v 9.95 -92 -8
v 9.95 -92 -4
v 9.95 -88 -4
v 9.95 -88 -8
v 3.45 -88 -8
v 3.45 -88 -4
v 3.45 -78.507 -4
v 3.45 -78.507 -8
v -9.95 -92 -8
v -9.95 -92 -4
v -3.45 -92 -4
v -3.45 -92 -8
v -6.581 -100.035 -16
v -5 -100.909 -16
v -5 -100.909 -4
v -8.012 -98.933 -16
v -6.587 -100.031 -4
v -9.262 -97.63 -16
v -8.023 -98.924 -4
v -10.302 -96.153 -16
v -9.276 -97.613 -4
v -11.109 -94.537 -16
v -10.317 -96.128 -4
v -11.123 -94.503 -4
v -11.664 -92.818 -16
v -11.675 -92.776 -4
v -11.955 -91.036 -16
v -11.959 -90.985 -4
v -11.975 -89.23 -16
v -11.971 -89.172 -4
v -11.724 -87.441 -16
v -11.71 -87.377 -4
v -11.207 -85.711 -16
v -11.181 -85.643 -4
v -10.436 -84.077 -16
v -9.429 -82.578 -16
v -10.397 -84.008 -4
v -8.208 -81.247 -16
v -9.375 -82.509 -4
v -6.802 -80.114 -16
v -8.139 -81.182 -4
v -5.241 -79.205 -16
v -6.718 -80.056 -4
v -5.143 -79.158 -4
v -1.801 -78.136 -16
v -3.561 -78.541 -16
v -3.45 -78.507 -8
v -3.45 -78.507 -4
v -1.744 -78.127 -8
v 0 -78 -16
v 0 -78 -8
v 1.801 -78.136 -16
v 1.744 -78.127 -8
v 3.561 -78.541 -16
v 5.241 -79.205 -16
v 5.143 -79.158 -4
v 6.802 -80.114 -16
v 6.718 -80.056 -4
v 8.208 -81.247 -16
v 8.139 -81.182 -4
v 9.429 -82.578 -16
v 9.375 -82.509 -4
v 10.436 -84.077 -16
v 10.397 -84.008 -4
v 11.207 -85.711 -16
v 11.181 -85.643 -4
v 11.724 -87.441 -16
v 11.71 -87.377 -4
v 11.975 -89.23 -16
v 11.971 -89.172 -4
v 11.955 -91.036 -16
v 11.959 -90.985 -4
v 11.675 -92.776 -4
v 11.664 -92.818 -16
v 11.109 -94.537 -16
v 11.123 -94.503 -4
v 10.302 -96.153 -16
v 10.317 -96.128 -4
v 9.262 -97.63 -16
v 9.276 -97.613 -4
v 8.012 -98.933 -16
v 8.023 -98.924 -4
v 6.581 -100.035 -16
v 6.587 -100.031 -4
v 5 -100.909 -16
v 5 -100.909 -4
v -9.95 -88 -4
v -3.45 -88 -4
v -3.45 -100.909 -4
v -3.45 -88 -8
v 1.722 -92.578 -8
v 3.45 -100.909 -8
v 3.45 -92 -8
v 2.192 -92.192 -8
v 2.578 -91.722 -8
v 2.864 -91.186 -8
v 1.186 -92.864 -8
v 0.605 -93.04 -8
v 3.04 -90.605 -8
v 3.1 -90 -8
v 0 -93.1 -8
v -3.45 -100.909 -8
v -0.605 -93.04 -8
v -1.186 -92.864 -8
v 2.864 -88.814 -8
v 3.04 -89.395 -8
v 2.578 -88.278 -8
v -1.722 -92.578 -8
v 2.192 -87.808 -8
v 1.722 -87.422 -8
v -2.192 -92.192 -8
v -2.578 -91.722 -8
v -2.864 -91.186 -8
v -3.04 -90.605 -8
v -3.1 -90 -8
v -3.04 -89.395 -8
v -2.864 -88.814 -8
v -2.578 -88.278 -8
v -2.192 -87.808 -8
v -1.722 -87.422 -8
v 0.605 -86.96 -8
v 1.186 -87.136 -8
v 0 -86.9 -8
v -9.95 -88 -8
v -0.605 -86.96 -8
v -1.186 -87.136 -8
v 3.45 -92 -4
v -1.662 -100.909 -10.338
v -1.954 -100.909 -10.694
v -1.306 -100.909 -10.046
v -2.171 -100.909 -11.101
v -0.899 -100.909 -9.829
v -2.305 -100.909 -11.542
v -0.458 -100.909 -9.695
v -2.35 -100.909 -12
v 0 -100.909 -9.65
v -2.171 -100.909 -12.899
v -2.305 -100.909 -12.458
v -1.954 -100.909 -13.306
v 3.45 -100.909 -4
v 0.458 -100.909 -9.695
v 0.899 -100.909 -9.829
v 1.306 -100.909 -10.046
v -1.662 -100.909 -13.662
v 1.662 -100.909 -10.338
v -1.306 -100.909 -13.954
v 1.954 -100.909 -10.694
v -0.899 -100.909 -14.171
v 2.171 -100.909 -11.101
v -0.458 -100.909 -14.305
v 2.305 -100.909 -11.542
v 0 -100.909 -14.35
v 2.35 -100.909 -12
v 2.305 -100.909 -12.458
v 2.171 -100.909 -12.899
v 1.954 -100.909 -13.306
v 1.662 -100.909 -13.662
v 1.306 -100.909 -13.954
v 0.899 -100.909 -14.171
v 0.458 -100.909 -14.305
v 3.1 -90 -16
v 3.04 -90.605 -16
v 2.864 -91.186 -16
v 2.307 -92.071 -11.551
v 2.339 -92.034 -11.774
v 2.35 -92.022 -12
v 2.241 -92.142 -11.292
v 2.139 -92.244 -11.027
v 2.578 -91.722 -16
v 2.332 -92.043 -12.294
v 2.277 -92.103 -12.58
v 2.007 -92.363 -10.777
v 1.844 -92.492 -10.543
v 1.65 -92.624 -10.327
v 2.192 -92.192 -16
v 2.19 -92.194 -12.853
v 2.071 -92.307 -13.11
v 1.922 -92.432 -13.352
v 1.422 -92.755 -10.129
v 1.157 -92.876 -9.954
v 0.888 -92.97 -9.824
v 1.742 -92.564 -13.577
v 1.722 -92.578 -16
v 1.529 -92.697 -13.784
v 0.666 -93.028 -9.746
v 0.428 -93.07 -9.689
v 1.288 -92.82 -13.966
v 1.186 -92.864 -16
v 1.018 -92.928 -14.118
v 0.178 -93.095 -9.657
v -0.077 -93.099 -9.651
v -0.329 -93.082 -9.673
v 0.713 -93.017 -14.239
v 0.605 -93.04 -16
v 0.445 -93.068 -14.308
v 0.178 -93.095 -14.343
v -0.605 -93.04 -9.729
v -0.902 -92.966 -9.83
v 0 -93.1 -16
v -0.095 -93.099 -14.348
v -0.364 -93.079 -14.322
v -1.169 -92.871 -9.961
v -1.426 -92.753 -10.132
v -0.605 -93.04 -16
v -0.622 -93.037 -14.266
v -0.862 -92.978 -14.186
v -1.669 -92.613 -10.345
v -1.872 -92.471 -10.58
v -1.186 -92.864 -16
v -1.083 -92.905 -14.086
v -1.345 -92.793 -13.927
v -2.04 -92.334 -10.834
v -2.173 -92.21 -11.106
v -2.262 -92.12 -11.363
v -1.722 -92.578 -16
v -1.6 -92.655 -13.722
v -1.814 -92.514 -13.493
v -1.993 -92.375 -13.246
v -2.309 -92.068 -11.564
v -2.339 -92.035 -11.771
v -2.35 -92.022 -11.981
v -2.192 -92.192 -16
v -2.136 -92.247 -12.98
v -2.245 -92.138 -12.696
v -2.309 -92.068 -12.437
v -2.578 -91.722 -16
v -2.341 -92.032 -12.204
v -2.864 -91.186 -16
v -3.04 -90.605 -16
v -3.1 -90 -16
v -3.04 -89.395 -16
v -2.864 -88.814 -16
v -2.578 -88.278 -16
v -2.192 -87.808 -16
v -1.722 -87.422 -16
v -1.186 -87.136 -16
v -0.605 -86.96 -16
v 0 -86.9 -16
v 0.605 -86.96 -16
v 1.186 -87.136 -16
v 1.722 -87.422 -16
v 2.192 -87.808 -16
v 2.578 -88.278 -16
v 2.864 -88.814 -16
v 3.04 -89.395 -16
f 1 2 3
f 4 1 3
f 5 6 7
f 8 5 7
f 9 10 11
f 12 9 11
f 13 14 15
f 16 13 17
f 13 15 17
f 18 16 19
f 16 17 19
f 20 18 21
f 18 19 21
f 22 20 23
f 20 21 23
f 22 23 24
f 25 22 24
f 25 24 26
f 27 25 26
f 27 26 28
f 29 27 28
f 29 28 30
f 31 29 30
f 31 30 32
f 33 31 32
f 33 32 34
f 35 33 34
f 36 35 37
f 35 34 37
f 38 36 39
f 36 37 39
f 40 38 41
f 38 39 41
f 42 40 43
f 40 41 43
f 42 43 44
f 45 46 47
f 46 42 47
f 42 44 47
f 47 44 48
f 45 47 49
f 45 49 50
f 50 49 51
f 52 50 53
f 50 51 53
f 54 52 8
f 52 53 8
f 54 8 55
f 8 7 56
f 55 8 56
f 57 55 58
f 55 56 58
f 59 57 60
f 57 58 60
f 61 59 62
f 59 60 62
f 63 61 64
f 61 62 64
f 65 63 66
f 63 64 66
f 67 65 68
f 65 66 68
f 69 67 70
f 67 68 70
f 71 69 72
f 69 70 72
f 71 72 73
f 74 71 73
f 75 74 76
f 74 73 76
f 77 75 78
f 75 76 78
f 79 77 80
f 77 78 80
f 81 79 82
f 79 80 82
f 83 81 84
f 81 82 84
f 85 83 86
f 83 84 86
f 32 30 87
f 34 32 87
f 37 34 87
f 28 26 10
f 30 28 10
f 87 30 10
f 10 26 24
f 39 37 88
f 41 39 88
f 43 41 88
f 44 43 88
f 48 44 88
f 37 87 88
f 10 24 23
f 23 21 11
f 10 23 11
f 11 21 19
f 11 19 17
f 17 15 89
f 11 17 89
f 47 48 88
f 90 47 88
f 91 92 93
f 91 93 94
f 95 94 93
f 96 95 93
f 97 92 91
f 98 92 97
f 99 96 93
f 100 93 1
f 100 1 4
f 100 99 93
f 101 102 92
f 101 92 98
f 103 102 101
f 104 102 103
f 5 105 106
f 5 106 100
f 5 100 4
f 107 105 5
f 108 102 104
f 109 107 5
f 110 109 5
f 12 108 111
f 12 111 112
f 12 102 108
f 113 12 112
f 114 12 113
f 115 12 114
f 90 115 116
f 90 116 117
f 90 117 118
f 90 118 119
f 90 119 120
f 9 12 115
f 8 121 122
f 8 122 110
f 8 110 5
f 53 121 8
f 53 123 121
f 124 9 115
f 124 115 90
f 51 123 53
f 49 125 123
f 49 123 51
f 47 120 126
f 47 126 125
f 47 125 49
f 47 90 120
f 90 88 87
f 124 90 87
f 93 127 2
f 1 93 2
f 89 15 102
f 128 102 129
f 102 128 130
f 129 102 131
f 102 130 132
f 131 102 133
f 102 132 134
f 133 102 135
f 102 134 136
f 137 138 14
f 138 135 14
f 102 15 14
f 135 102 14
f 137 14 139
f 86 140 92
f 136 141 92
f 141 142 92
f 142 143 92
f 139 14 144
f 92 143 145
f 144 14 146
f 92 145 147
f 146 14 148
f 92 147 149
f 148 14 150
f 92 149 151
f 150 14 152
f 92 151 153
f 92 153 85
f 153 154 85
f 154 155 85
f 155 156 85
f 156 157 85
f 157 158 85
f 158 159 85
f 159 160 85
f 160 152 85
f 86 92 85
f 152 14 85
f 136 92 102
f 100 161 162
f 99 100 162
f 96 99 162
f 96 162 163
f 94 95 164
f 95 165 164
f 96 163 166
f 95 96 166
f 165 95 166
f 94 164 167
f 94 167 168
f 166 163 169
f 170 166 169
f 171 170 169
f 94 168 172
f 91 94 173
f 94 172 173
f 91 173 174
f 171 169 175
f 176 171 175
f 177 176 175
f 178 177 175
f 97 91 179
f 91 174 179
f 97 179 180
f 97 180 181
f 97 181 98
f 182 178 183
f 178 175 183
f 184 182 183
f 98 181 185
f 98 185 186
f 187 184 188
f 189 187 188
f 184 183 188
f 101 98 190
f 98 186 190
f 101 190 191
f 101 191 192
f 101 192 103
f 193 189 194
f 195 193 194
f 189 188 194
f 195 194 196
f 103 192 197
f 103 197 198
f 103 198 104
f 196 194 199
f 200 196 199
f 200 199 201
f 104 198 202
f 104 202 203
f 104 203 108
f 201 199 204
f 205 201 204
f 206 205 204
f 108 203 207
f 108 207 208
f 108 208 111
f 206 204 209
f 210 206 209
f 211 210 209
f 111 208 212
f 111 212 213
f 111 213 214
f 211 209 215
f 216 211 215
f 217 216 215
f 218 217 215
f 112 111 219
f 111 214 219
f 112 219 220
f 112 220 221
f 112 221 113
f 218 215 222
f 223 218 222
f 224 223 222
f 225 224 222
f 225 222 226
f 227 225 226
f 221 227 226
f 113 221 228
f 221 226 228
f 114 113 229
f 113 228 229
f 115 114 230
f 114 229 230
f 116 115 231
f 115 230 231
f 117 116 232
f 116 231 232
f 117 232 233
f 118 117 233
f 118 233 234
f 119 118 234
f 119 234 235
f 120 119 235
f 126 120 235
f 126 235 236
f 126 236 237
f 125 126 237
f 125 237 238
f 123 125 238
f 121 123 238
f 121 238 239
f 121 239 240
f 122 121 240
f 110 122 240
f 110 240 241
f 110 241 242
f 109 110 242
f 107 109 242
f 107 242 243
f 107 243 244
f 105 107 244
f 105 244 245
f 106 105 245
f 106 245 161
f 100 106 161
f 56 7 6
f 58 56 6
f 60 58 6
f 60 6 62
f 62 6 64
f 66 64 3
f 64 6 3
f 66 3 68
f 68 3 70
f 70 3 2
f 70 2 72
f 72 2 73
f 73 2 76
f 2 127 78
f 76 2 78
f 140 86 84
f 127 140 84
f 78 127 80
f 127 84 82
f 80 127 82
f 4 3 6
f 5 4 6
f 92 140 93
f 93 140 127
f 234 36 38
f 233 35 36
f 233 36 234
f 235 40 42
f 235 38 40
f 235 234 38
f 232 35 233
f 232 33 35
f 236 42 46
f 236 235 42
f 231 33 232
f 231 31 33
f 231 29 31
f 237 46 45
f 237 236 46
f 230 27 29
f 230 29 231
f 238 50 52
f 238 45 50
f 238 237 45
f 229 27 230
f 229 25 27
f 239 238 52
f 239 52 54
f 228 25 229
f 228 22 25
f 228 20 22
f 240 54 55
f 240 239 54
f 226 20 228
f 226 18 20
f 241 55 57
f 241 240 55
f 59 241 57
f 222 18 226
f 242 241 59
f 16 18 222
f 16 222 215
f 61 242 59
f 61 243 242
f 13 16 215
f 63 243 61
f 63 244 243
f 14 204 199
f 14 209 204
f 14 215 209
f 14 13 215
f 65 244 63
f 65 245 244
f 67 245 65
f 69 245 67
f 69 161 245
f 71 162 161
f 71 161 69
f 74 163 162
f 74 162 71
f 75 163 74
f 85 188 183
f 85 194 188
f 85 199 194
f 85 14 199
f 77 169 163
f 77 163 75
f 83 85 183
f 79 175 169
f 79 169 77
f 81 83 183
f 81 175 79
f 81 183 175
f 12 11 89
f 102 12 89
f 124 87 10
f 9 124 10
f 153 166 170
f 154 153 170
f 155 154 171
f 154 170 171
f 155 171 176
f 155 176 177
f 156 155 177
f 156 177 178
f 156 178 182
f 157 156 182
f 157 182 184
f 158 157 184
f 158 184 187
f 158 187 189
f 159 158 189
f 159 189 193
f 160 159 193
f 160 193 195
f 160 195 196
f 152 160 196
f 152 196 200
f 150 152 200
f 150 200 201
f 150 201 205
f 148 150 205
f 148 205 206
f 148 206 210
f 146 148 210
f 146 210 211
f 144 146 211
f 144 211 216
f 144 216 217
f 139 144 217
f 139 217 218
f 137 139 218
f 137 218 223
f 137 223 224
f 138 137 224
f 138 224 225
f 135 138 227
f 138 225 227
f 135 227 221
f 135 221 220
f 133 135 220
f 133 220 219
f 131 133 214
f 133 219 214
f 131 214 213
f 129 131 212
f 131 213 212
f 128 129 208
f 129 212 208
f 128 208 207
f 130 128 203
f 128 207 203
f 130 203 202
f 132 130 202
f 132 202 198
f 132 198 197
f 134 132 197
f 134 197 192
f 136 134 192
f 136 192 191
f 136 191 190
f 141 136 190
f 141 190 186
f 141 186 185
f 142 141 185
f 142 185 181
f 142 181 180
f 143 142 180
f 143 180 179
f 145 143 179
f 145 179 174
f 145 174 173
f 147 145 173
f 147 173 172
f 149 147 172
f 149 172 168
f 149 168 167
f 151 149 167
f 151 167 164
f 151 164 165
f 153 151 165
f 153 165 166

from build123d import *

# Parameters (mm, degrees)
PAD125_DEPTH            = 4
SKETCH248_R             = 12
PAD126_DEPTH            = 12
POCKET089_DEPTH         = 8
SKETCH249_R             = 3.1
POCKET090_DEPTH         = 12.001
SKETCH250_R             = 2.35
POCKET091_DEPTH         = 12.001
SKETCH251_W             = 10
SKETCH251_H             = 6.070738
POCKET092_DEPTH         = 12.001
BODY142_PLACEMENT_ANGLE = 180


with BuildPart() as part:
    # Sketch247 → Pad125 (new body)
    with BuildSketch(Plane.XY):
        Polygon((-3.45, 2), (-3.45, 18.25), (3.45, 18.25), (3.45, 2), (9.95, 2), (9.95, -2), (3.45, -2), (3.45, -18.25), (-3.45, -18.25), (-3.45, -2), (-9.95, -2), (-9.95, 2), align=None)
    extrude(amount=PAD125_DEPTH)

    # Sketch248 (on Face14 of Pad125) → Pad126 (join)
    with BuildSketch(Plane.XY.offset(4)):
        Circle(SKETCH248_R)
    extrude(amount=PAD126_DEPTH)

    # Pad126 Face4 → Pocket089 (cut)
    with BuildSketch(Plane(origin=(0, 0, 0), x_dir=(0, -1, 0), z_dir=(0, 0, -1))):
        Polygon((-2, 3.45), (-18.25, 3.45), (-18.25, -3.45), (-2, -3.45), (-2, -9.95), (2, -9.95), (2, -3.45), (18.25, -3.45), (18.25, 3.45), (2, 3.45), (2, 9.95), (-2, 9.95), align=None)
    extrude(amount=-POCKET089_DEPTH, mode=Mode.SUBTRACT)

    # Sketch249 (on Face9 of Pocket089) → Pocket090 (cut, through all)
    with BuildSketch(Plane.XY.offset(16)):
        Circle(SKETCH249_R)
    extrude(amount=-POCKET090_DEPTH, mode=Mode.SUBTRACT)

    # Sketch250 → Pocket091 (cut, through all)
    with BuildSketch(Plane.XZ):
        with Locations((0, 12)):
            Circle(SKETCH250_R)
    extrude(amount=-POCKET091_DEPTH, mode=Mode.SUBTRACT)

    # Sketch251 (on Face12 of Pocket091) → Pocket092 (cut, through all)
    with BuildSketch(Plane.XY.offset(16)):
        with Locations((0, 13.944081)):
            Rectangle(SKETCH251_W, SKETCH251_H)
    extrude(amount=-POCKET092_DEPTH, mode=Mode.SUBTRACT)


with BuildPart() as part_1:
    # Body142 placement: moved
    add(part.part.moved(Location((0, -90, 0))).rotate(Axis((0, -90, 0), (-1, 0, 0)), BODY142_PLACEMENT_ANGLE))


solid = part_1.part
